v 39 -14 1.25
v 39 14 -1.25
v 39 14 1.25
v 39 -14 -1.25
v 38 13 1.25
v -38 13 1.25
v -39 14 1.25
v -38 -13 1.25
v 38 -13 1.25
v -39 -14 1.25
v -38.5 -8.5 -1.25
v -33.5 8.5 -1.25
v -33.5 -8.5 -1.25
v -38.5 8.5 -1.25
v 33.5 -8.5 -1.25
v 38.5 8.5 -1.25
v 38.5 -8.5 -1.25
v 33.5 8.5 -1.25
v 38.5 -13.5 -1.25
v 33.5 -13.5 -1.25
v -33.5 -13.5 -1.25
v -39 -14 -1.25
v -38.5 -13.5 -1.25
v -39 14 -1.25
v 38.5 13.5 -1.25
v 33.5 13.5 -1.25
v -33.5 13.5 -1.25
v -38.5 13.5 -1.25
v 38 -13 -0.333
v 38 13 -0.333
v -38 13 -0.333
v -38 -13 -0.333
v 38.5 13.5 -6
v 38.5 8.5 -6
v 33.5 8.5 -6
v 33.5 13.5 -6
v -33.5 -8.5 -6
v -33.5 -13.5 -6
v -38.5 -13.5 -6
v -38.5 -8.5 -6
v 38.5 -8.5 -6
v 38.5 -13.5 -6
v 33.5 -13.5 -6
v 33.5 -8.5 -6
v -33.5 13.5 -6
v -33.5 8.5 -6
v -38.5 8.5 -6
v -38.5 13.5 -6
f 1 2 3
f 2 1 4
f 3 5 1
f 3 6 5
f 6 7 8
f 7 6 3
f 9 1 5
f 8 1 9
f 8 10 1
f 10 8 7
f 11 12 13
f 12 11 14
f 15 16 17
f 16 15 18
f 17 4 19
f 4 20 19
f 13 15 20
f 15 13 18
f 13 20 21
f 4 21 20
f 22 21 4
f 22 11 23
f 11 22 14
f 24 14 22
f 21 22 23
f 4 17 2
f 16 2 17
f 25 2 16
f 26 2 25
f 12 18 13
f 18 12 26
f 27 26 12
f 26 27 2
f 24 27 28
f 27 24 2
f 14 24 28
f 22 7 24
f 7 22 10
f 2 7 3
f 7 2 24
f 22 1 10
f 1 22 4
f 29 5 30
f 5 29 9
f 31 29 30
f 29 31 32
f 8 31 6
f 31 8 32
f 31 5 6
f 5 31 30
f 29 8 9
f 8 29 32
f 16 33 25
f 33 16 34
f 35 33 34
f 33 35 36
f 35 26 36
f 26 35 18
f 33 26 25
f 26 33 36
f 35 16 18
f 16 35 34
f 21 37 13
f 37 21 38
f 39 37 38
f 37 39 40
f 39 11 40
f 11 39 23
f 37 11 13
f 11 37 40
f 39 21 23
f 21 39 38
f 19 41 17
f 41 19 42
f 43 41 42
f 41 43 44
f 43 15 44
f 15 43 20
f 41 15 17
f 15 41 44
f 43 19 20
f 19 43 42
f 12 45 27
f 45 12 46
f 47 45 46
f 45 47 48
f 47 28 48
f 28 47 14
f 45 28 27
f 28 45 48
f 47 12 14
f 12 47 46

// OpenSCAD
/*holder for a microfluidic chamber.
The holder is lifted in the air, so that a light source can be slid below it */

//chamber
chamX = 75;
chamY = 25;
chamZ = 5;
offsetZ = 2;
offsetX = 3;


//holder
difference(){
    cube([chamX+offsetX,chamY+offsetX,chamZ/2],center=true);
    translate([0,0,0.5]){
    cube([chamX+(offsetX/3),chamY+(offsetX/3),chamZ/3],center=true);}
}

//feet
translate([chamX/2-(offsetX/2),chamY/2-(offsetX/2),-chamZ/2-(offsetZ/2)]){
cube([5,5,5],center=true);}

translate([-chamX/2+(offsetX/2),-chamY/2+(offsetX/2),-chamZ/2-(offsetZ/2)]){
cube([5,5,5],center=true);}

translate([chamX/2-(offsetX/2),-chamY/2+(offsetX/2),-chamZ/2-(offsetZ/2)]){
cube([5,5,5],center=true);}

translate([-chamX/2+(offsetX/2),chamY/2-(offsetX/2),-chamZ/2-(offsetZ/2)]){
cube([5,5,5],center=true);}
